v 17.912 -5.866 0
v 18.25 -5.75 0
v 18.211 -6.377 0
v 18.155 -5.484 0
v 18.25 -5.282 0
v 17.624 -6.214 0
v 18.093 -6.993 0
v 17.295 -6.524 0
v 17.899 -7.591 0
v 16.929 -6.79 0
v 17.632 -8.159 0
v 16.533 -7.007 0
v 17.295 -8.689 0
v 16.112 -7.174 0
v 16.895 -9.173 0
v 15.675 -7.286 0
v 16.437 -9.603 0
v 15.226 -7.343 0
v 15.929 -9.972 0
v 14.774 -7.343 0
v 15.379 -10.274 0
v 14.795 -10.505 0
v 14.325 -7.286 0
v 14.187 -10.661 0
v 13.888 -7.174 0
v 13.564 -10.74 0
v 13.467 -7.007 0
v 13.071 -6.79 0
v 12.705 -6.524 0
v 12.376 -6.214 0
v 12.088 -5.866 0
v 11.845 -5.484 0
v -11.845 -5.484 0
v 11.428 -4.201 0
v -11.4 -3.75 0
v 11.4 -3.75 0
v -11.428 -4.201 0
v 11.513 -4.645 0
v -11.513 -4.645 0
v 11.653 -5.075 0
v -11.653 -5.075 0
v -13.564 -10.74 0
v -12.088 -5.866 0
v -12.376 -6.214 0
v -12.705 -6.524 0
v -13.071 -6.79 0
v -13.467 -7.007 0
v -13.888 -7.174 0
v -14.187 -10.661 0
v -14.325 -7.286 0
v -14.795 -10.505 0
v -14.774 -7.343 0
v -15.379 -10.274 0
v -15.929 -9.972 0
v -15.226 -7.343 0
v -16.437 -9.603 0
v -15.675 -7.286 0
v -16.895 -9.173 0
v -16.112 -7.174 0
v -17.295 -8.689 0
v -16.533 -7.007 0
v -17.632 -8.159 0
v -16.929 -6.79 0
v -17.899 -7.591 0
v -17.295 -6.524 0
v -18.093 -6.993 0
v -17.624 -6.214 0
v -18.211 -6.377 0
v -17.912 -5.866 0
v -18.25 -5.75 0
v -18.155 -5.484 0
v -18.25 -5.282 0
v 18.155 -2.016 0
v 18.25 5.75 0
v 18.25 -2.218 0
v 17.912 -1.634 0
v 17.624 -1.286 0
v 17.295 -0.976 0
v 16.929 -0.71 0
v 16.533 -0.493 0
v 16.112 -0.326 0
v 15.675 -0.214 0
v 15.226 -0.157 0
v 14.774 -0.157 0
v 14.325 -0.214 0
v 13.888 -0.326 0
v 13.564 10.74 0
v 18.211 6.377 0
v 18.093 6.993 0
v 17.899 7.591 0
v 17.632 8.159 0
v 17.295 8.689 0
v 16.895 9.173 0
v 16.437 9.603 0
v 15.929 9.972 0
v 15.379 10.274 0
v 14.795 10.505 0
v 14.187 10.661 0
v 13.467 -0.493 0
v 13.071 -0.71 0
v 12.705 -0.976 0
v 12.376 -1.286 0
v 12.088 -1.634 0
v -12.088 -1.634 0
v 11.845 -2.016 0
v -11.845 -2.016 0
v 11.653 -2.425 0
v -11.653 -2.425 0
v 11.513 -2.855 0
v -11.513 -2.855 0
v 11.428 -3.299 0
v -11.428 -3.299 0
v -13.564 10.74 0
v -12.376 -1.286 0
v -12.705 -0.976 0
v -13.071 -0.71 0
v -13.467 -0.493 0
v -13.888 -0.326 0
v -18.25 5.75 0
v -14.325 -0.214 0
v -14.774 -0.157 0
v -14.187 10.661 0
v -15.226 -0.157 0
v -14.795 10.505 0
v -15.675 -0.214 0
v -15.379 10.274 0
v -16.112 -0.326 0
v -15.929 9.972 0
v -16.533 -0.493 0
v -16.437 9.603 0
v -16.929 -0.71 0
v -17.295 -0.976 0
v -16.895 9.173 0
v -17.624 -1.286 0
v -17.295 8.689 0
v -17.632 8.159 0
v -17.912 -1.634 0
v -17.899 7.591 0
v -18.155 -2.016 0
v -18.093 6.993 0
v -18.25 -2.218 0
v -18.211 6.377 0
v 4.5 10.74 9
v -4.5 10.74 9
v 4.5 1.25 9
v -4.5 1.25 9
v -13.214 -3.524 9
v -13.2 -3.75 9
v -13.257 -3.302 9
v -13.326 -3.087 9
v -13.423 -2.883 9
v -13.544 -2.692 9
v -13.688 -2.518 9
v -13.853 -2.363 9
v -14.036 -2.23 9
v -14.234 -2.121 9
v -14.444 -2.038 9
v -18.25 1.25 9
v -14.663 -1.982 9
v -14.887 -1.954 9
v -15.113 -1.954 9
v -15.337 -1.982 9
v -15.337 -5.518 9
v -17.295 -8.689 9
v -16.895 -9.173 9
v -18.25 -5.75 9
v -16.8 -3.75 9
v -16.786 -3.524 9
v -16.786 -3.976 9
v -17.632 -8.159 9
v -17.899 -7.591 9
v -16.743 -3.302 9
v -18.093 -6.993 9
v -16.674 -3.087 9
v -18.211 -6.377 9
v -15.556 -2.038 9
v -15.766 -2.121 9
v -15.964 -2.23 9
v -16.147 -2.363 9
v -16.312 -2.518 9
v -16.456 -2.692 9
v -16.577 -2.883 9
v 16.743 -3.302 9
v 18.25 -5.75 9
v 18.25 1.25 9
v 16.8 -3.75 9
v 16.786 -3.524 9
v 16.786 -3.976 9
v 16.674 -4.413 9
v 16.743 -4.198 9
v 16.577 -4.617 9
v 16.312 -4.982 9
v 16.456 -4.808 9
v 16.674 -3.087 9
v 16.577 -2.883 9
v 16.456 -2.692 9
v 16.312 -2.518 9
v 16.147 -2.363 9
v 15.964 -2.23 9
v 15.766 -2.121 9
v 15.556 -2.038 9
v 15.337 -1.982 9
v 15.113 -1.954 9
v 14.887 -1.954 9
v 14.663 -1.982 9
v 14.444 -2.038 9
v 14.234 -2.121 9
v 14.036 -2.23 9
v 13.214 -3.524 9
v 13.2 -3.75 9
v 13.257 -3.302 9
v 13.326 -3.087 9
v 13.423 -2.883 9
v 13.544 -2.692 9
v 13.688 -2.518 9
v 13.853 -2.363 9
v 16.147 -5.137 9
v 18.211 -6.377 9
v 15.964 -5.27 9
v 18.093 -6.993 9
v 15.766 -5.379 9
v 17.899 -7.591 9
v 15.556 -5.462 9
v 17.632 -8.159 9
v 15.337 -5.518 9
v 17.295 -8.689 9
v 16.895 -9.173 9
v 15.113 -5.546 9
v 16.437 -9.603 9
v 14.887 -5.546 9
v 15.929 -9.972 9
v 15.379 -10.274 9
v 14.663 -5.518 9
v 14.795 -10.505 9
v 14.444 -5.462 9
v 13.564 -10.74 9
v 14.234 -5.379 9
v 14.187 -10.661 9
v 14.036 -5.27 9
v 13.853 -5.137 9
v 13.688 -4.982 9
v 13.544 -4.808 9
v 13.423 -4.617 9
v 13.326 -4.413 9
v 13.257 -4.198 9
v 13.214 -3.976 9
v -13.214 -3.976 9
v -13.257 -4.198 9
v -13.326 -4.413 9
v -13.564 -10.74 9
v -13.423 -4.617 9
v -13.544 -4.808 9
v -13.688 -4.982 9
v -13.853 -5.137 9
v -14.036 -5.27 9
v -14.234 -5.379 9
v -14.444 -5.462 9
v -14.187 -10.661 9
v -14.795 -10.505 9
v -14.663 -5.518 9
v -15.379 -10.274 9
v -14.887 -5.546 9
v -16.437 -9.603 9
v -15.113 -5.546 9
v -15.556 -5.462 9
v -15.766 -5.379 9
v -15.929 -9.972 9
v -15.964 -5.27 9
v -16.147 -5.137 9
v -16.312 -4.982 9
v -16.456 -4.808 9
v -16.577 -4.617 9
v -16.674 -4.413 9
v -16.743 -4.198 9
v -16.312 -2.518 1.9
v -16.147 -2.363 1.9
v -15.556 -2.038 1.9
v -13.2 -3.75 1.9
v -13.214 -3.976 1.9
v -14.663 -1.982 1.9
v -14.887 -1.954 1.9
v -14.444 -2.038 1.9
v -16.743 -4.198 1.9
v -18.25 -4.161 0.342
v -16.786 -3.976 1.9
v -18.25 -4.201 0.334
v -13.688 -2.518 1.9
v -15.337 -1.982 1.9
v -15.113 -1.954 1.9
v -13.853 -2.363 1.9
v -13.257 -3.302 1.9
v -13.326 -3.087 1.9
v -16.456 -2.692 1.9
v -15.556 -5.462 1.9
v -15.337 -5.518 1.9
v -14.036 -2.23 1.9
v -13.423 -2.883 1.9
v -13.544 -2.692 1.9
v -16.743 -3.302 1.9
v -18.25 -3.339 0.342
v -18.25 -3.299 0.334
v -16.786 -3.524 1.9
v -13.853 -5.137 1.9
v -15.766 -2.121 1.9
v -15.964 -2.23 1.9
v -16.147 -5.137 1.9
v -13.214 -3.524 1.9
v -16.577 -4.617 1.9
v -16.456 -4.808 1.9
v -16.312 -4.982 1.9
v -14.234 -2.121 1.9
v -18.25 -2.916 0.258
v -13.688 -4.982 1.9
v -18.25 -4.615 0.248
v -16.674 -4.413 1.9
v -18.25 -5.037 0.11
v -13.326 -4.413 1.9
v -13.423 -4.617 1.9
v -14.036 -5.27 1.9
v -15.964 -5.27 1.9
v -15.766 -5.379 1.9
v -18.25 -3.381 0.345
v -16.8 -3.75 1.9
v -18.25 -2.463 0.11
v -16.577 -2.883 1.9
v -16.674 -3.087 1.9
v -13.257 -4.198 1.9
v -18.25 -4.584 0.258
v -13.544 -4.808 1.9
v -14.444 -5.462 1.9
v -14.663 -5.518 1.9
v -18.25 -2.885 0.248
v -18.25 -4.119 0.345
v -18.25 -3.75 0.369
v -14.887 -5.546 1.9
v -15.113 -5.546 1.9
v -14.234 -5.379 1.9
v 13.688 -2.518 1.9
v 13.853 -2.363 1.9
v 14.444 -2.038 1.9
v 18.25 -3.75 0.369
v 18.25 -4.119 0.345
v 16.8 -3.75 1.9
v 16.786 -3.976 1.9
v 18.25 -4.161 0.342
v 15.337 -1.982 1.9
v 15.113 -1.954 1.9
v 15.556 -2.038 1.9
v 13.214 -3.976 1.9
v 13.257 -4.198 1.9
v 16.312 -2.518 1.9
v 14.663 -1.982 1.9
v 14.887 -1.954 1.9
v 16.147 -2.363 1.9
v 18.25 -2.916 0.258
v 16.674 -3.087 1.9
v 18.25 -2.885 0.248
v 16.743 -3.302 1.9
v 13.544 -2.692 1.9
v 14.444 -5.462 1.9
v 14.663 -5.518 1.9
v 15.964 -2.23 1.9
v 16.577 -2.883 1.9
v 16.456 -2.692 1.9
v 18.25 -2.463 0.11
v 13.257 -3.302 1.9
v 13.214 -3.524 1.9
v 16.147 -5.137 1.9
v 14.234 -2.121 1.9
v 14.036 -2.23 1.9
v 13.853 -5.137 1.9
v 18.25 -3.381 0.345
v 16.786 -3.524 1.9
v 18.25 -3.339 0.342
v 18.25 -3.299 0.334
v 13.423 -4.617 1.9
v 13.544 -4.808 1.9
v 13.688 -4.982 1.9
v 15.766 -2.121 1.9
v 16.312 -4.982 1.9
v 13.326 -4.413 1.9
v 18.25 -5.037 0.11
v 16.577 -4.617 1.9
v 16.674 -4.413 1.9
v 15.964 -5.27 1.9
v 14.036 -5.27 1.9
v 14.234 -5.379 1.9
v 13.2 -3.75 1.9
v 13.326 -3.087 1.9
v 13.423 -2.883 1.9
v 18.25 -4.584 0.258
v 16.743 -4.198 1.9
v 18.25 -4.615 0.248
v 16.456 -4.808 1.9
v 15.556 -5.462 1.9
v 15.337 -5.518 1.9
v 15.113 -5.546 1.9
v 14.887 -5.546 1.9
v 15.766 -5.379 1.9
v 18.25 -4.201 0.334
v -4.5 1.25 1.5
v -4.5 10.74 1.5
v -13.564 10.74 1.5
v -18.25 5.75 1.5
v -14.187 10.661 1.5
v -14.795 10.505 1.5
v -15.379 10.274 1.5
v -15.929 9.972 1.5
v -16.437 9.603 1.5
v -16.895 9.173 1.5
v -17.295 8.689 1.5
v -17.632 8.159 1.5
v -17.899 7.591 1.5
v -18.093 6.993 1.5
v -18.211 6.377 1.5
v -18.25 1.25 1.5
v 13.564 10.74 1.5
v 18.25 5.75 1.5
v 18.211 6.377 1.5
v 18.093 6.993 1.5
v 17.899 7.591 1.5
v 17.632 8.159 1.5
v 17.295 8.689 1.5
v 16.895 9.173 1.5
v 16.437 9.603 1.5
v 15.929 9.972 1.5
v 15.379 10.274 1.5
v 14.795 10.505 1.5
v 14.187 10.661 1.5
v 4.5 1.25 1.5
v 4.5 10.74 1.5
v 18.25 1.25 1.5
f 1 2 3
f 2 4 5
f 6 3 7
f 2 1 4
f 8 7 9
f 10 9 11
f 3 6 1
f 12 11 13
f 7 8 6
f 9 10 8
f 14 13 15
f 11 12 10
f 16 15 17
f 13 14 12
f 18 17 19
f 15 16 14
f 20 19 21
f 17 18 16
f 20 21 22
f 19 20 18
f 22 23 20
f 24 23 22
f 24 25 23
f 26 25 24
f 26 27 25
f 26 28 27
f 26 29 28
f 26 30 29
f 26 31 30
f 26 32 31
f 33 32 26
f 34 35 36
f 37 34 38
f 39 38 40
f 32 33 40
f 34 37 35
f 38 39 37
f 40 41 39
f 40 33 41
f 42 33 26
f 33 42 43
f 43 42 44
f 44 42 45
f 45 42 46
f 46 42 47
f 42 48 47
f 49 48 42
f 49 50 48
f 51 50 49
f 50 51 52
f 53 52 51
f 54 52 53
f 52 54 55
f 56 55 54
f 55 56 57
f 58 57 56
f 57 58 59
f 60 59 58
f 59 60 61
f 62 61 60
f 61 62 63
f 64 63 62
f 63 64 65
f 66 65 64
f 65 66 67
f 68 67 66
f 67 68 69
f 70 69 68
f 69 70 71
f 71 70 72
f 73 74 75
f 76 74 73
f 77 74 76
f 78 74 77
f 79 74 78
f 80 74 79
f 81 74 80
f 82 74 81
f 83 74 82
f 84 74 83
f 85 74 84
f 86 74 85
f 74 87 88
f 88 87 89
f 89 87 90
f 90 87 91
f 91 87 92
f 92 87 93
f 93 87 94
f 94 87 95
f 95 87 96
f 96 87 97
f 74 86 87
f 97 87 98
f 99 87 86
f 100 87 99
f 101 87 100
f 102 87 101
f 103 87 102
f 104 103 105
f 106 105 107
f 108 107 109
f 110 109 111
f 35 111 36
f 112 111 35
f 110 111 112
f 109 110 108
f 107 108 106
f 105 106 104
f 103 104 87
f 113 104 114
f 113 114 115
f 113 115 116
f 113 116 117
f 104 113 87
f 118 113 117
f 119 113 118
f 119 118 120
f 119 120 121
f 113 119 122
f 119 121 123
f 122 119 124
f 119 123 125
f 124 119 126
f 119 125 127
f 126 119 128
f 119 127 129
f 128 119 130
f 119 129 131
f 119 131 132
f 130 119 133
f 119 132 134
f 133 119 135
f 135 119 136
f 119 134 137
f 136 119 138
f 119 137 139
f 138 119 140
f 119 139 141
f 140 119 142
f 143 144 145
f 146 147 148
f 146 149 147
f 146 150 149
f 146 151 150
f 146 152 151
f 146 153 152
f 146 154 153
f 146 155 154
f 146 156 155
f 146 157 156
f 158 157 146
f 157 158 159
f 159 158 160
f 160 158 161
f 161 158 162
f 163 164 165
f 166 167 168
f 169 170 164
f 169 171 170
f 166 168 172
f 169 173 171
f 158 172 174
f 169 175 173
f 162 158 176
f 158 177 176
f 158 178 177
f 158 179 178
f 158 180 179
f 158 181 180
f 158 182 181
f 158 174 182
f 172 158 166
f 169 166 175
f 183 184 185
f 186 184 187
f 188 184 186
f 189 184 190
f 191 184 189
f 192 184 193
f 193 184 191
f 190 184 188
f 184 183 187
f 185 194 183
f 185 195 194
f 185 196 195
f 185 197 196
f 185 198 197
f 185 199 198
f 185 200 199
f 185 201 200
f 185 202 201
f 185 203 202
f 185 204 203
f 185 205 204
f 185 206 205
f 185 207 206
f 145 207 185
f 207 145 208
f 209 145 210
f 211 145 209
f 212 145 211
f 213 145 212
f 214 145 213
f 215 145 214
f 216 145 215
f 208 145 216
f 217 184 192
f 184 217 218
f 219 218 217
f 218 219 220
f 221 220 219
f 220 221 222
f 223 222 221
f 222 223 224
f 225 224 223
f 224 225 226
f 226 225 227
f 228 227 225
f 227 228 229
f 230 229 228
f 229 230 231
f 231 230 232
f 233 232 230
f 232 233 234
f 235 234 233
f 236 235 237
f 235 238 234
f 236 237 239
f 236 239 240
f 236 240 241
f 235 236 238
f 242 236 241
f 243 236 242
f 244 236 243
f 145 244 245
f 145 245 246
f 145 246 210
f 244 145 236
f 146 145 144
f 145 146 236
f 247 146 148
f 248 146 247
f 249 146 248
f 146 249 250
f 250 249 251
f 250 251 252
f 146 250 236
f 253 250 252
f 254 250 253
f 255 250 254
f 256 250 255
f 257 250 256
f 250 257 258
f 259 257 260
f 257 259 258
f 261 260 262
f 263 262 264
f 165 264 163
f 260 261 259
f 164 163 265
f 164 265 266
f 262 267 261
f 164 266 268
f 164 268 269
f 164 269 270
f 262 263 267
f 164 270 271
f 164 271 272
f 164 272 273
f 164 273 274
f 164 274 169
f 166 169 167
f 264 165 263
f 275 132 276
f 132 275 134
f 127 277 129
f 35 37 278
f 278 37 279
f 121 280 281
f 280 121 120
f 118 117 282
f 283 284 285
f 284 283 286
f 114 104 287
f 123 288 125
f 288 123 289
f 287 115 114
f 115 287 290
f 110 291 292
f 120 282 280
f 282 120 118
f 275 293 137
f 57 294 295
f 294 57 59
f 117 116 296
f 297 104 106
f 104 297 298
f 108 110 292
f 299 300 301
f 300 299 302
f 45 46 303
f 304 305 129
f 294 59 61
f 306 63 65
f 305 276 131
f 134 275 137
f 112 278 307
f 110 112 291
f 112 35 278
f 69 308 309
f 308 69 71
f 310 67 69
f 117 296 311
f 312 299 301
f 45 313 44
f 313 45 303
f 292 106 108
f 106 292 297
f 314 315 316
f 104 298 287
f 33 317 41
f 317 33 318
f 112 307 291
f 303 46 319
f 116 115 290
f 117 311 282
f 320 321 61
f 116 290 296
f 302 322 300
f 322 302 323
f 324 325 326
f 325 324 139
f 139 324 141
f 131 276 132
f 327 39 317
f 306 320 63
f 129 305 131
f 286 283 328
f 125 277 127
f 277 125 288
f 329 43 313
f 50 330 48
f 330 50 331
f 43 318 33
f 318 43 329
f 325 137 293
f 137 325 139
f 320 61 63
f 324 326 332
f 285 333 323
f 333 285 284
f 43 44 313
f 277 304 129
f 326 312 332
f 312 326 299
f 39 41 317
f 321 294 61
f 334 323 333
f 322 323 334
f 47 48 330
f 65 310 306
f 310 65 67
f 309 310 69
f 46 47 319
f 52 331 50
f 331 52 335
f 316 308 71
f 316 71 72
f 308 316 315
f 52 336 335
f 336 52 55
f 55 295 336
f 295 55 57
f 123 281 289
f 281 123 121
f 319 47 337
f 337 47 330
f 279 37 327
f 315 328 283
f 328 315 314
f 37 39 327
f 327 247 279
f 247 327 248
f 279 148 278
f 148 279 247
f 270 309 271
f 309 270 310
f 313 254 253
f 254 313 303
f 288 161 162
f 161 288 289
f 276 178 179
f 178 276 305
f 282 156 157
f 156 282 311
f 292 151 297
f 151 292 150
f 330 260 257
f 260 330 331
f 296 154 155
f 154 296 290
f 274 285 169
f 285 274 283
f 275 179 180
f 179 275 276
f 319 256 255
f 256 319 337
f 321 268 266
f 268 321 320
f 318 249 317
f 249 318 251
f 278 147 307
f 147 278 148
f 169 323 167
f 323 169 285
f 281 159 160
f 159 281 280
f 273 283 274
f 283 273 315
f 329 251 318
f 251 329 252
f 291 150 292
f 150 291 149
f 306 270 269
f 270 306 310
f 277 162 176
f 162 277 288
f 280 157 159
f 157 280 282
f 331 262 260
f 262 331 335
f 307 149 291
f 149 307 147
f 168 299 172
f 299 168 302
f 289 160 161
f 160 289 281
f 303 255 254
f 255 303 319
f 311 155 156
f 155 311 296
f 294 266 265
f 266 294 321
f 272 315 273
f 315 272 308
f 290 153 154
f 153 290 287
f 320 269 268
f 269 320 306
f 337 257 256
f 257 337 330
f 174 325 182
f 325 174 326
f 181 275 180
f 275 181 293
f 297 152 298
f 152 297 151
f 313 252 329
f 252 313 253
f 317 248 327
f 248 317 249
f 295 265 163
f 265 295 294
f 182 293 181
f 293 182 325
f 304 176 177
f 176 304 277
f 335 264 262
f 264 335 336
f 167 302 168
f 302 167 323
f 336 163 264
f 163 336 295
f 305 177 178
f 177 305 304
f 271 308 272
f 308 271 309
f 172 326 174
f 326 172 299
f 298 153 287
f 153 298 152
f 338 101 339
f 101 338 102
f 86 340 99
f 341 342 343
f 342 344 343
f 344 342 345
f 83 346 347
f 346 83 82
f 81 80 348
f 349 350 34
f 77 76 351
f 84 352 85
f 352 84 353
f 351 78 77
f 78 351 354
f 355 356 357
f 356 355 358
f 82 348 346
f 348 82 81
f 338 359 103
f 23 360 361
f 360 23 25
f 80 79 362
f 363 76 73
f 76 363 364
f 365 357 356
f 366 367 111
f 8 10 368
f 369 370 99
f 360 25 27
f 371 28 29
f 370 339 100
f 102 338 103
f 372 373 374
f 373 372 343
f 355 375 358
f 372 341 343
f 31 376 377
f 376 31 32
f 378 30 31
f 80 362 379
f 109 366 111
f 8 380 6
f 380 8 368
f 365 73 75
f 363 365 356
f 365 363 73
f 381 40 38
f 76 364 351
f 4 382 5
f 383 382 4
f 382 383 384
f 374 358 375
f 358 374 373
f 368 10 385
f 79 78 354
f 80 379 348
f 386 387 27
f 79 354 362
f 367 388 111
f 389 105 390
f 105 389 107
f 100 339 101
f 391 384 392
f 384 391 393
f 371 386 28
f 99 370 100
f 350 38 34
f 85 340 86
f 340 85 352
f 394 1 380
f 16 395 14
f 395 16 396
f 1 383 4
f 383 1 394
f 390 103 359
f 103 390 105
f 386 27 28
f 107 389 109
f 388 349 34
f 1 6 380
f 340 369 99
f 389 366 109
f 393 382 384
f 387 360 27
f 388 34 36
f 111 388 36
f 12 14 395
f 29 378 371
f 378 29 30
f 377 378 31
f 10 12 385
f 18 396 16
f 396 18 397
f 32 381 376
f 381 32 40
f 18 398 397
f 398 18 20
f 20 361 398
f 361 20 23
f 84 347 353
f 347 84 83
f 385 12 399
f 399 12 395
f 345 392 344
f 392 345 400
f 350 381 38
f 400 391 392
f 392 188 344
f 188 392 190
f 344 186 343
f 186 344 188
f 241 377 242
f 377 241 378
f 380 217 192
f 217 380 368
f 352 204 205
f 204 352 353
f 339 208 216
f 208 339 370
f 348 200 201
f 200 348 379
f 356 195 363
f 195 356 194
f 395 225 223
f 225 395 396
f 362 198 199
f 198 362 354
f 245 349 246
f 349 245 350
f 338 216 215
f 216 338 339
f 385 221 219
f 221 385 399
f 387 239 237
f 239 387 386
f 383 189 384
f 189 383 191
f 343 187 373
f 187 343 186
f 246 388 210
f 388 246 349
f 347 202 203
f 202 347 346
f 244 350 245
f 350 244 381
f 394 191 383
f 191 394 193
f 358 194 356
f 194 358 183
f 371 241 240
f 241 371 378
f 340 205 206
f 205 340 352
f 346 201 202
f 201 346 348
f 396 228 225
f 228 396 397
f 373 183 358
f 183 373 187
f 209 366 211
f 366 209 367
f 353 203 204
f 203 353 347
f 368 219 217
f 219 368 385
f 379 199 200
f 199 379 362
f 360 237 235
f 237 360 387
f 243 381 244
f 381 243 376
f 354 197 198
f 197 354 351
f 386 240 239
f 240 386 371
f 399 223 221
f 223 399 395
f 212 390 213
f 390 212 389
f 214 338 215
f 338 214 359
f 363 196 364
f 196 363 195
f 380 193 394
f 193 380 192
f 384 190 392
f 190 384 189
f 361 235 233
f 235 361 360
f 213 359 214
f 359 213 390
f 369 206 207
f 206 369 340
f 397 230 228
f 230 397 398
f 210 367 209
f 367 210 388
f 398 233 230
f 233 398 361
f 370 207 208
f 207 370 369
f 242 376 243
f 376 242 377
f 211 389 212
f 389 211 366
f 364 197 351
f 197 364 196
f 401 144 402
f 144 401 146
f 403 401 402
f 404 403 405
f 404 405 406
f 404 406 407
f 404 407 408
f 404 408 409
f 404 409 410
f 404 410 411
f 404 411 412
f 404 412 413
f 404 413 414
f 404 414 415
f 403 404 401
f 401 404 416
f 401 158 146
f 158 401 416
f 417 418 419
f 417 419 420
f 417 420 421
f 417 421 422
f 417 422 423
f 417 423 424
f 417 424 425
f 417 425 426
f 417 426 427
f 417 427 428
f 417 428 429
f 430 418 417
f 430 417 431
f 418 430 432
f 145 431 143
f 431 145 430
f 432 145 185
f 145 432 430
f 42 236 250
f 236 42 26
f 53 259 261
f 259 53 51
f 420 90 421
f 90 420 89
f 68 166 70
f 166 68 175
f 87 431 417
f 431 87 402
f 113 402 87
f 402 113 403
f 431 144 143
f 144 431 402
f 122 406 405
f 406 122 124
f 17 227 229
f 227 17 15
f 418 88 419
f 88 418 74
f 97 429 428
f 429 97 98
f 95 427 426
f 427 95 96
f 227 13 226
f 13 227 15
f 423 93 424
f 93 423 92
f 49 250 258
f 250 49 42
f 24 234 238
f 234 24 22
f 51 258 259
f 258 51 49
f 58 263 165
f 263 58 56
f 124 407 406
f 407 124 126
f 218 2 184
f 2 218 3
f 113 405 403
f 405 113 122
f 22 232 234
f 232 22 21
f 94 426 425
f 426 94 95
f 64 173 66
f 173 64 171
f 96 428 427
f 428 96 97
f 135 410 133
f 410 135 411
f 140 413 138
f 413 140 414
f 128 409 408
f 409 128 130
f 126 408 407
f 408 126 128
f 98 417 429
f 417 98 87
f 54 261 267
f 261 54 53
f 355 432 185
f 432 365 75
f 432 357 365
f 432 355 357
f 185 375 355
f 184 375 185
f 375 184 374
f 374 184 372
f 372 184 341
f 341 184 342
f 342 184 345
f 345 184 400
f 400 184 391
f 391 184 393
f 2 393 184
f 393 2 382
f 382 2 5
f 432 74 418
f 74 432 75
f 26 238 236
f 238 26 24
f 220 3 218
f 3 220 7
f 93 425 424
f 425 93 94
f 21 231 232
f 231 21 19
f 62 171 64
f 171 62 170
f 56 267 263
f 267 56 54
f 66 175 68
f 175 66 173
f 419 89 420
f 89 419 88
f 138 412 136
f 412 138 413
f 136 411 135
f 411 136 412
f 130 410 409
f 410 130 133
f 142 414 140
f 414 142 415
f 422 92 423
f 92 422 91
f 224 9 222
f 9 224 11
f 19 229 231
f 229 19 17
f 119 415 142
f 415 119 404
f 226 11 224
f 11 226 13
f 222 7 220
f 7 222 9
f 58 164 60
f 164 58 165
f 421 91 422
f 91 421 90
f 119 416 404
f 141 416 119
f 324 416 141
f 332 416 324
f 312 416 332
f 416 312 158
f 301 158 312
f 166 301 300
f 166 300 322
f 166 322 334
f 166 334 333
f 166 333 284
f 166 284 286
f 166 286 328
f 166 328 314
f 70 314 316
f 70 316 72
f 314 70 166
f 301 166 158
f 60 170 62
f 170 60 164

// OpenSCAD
$fn = 50;


difference() {
	union() {
		hull() {
			translate(v = [-13.2500000000, 5.7500000000, 0]) {
				cylinder(h = 9, r = 5);
			}
			translate(v = [13.2500000000, 5.7500000000, 0]) {
				cylinder(h = 9, r = 5);
			}
			translate(v = [-13.2500000000, -5.7500000000, 0]) {
				cylinder(h = 9, r = 5);
			}
			translate(v = [13.2500000000, -5.7500000000, 0]) {
				cylinder(h = 9, r = 5);
			}
		}
	}
	union() {
		translate(v = [-15, -3.7500000000, 0]) {
			rotate(a = [180, 0, 0]) {
				difference() {
					union() {
						#translate(v = [0, 0, -9.0000000000]) {
							cylinder(h = 9, r = 1.5000000000);
						}
						#translate(v = [0, 0, -1.9000000000]) {
							cylinder(h = 1.9000000000, r1 = 1.8000000000, r2 = 3.6000000000);
						}
						#translate(v = [0, 0, -9.0000000000]) {
							cylinder(h = 9, r = 1.8000000000);
						}
						#translate(v = [0, 0, -9.0000000000]) {
							cylinder(h = 9, r = 1.5000000000);
						}
					}
					union();
				}
			}
		}
		translate(v = [15, -3.7500000000, 0]) {
			rotate(a = [180, 0, 0]) {
				difference() {
					union() {
						#translate(v = [0, 0, -9.0000000000]) {
							cylinder(h = 9, r = 1.5000000000);
						}
						#translate(v = [0, 0, -1.9000000000]) {
							cylinder(h = 1.9000000000, r1 = 1.8000000000, r2 = 3.6000000000);
						}
						#translate(v = [0, 0, -9.0000000000]) {
							cylinder(h = 9, r = 1.8000000000);
						}
						#translate(v = [0, 0, -9.0000000000]) {
							cylinder(h = 9, r = 1.5000000000);
						}
					}
					union();
				}
			}
		}
		#translate(v = [-160.5000000000, 1.2500000000, 1.5000000000]) {
			cube(size = [156, 100, 7.5000000000]);
		}
		#translate(v = [4.5000000000, 1.2500000000, 1.5000000000]) {
			cube(size = [156, 100, 7.5000000000]);
		}
	}
}
